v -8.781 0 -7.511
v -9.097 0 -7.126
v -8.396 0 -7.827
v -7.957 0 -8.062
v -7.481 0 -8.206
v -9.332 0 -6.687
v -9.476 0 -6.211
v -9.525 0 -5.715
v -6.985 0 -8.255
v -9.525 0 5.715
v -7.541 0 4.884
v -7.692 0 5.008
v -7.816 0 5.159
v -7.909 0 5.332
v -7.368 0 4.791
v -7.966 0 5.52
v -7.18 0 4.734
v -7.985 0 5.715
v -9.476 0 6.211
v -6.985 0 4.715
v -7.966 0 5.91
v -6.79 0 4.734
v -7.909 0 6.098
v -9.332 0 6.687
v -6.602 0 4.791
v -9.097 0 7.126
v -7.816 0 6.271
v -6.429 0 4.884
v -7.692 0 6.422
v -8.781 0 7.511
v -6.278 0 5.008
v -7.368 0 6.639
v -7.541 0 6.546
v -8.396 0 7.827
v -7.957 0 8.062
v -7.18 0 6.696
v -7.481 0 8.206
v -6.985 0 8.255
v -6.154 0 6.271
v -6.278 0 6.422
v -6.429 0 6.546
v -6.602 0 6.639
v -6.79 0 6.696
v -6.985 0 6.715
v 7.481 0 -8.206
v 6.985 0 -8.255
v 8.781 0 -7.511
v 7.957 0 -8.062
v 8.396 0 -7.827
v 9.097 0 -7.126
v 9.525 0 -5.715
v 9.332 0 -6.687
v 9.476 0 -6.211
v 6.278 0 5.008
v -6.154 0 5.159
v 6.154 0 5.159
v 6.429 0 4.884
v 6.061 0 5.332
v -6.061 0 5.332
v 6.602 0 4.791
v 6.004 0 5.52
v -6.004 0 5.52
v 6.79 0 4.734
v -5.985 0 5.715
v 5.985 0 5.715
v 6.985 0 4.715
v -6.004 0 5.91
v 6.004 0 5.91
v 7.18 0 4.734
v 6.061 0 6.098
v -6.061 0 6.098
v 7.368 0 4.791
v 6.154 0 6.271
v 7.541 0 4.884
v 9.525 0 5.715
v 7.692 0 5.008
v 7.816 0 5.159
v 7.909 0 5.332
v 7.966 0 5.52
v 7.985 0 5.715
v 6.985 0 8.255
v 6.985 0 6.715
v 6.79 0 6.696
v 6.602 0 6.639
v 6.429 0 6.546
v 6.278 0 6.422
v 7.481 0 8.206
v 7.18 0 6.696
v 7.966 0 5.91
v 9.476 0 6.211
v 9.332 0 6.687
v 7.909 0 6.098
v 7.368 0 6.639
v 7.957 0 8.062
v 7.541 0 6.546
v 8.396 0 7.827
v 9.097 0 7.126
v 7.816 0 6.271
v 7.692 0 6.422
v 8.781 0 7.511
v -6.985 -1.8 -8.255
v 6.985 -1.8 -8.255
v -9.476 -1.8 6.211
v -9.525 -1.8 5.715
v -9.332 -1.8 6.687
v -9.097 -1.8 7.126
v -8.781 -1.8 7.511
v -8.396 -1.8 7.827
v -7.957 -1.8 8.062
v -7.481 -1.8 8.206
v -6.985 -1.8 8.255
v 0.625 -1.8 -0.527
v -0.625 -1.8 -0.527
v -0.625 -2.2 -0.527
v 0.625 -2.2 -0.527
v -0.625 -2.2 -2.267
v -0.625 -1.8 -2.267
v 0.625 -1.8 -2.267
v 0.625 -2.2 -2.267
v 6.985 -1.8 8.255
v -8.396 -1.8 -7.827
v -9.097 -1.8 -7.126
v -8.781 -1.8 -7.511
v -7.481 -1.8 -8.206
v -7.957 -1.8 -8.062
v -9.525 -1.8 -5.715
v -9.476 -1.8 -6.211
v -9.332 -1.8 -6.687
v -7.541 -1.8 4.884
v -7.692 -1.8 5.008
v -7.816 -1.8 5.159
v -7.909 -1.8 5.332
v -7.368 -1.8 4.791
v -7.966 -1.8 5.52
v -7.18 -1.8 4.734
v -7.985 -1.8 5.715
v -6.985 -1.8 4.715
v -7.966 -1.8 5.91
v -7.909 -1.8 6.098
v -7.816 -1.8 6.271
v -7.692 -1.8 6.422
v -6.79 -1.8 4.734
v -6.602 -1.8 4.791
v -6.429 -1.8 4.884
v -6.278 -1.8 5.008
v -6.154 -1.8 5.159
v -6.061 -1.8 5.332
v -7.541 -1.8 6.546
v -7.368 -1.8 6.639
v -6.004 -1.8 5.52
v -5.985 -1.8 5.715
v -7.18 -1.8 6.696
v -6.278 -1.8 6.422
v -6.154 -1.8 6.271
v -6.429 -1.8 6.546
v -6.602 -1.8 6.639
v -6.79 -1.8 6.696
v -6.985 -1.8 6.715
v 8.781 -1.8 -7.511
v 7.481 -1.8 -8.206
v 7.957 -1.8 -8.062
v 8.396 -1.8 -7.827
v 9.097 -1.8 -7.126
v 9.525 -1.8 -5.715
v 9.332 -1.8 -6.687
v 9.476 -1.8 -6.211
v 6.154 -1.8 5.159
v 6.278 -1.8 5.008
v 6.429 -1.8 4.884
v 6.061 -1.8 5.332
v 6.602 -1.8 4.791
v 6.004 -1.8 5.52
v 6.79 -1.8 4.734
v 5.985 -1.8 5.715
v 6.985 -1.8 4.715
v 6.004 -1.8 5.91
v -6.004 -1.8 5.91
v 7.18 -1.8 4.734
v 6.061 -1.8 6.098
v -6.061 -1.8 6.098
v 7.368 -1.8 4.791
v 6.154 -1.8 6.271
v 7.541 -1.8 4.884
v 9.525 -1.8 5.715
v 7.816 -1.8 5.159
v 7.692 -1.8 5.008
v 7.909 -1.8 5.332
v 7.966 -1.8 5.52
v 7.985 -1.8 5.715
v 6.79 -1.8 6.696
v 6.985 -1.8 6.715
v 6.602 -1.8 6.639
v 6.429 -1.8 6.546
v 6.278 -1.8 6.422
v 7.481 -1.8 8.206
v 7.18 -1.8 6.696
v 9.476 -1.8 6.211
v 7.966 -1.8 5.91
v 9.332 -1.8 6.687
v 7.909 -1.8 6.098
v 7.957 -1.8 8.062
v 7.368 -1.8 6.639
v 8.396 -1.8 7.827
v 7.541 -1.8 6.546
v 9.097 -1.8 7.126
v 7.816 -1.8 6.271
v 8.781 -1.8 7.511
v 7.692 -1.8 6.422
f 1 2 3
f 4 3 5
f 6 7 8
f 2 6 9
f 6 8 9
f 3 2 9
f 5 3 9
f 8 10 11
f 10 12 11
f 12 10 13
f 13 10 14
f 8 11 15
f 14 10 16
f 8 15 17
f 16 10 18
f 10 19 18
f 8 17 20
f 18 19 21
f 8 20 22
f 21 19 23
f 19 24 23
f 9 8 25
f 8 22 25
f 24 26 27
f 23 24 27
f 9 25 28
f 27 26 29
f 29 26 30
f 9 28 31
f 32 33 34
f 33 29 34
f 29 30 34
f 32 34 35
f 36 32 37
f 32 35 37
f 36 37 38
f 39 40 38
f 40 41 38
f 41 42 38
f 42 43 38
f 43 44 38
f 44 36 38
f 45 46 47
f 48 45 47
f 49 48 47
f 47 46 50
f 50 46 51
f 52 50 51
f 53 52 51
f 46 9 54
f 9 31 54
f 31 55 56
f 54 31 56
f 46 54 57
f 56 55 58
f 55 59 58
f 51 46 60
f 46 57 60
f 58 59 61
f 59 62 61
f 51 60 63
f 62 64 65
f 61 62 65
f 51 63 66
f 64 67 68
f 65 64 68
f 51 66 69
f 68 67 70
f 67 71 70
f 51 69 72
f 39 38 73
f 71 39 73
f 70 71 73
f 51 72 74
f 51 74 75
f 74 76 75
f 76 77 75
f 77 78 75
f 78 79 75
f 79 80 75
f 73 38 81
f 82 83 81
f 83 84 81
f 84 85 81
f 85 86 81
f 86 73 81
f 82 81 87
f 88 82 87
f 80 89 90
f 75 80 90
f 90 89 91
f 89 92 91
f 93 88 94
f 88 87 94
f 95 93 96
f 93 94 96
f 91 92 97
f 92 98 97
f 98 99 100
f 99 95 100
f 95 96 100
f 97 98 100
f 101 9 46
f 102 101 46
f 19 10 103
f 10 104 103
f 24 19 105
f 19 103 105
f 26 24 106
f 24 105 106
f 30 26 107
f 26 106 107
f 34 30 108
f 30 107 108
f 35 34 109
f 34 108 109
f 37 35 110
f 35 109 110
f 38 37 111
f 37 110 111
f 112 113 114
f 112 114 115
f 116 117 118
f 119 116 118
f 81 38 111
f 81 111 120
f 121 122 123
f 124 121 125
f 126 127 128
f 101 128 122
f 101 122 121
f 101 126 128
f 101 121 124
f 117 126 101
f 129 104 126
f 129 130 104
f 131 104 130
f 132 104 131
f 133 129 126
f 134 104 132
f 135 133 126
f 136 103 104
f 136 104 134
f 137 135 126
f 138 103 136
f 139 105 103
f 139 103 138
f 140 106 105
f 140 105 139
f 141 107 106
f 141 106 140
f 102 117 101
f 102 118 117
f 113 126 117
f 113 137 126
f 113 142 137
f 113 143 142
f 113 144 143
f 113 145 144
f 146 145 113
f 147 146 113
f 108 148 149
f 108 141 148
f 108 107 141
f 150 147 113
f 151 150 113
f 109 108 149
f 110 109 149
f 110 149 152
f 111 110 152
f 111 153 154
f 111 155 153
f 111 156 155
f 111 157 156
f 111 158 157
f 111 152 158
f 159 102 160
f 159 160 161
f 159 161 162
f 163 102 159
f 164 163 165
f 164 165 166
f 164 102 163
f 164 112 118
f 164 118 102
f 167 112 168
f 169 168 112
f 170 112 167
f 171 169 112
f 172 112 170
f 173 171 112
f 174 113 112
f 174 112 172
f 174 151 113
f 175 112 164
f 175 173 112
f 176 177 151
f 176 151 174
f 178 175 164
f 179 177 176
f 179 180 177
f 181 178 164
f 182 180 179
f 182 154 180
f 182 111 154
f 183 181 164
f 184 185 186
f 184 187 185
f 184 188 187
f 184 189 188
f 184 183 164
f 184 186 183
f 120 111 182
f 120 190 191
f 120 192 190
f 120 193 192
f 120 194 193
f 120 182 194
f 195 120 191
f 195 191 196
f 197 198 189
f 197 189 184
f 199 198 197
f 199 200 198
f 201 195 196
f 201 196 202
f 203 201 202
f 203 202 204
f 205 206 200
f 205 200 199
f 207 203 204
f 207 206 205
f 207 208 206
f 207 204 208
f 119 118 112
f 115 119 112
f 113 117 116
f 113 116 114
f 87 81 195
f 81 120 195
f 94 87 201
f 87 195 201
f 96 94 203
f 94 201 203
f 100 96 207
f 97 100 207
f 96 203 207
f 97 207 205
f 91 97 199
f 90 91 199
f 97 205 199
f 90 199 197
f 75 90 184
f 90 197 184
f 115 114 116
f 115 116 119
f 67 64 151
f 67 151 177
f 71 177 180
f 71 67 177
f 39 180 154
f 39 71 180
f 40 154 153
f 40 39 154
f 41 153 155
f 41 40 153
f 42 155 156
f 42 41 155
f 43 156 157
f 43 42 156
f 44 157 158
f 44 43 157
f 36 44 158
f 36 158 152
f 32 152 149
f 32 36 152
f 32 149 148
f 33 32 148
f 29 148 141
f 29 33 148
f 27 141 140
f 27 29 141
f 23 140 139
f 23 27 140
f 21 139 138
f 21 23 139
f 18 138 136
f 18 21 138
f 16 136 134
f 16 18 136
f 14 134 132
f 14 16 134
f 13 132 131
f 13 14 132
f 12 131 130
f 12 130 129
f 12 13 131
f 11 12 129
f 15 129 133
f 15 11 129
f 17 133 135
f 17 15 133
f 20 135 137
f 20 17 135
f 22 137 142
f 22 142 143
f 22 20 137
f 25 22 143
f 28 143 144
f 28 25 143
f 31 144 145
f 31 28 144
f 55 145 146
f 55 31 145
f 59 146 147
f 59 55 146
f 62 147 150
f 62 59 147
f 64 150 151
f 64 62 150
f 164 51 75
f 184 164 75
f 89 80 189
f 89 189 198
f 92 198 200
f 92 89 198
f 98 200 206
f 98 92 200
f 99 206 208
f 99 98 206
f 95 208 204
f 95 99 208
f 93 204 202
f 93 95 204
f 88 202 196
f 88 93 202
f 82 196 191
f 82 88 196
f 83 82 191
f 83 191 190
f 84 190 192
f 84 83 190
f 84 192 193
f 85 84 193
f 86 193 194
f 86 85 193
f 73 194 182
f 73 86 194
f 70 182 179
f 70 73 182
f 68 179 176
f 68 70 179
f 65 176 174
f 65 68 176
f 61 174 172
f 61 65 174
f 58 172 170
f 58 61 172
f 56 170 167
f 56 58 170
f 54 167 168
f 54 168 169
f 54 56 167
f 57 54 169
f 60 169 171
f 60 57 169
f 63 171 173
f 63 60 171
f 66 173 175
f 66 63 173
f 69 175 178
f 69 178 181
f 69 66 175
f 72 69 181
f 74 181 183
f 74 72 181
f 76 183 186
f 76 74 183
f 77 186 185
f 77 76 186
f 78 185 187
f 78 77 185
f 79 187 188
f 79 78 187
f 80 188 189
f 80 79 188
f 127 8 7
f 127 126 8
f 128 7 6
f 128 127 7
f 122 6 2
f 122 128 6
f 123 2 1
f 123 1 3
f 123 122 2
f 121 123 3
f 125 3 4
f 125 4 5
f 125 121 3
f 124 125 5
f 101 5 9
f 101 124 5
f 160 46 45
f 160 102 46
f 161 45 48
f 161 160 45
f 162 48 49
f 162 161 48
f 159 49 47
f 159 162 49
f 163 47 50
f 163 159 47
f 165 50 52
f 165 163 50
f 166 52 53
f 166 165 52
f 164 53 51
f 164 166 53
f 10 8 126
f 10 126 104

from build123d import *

# Parameters (mm, degrees)
F0_W     = 19.05
F0_H     = 16.51
F0_W_2   = 1.25
F0_H_2   = 1.74
F0_R     = 1
F1_DEPTH = 1.8
F2_DEPTH = 2.2
F3_R     = 2.54


with BuildPart() as f1:
    # F0 (on Front) → F1 (new body)
    with BuildSketch(Plane.XZ):
        Rectangle(F0_W, F0_H)
        with Locations((0, -1.397)):
            Rectangle(F0_W_2, F0_H_2, mode=Mode.SUBTRACT)
        with Locations((-6.985, 5.715)):
            Circle(F0_R, mode=Mode.SUBTRACT)
        with Locations((6.985, 5.715)):
            Circle(F0_R, mode=Mode.SUBTRACT)
    extrude(amount=F1_DEPTH)

    # F0 (on Front) → F2 (join)
    with BuildSketch(Plane.XZ):
        with Locations((0, -1.397)):
            Rectangle(F0_W_2, F0_H_2)
    extrude(amount=F2_DEPTH)

    # F3
    f3_edges = [f1.edges().sort_by_distance(p)[0] for p in [
        (-9.525, -0.9, 8.255),
        (9.525, -0.9, 8.255),
        (9.525, -0.9, -8.255),
        (-9.525, -0.9, -8.255),
    ]]
    fillet(f3_edges, radius=F3_R)


solid = f1.part
